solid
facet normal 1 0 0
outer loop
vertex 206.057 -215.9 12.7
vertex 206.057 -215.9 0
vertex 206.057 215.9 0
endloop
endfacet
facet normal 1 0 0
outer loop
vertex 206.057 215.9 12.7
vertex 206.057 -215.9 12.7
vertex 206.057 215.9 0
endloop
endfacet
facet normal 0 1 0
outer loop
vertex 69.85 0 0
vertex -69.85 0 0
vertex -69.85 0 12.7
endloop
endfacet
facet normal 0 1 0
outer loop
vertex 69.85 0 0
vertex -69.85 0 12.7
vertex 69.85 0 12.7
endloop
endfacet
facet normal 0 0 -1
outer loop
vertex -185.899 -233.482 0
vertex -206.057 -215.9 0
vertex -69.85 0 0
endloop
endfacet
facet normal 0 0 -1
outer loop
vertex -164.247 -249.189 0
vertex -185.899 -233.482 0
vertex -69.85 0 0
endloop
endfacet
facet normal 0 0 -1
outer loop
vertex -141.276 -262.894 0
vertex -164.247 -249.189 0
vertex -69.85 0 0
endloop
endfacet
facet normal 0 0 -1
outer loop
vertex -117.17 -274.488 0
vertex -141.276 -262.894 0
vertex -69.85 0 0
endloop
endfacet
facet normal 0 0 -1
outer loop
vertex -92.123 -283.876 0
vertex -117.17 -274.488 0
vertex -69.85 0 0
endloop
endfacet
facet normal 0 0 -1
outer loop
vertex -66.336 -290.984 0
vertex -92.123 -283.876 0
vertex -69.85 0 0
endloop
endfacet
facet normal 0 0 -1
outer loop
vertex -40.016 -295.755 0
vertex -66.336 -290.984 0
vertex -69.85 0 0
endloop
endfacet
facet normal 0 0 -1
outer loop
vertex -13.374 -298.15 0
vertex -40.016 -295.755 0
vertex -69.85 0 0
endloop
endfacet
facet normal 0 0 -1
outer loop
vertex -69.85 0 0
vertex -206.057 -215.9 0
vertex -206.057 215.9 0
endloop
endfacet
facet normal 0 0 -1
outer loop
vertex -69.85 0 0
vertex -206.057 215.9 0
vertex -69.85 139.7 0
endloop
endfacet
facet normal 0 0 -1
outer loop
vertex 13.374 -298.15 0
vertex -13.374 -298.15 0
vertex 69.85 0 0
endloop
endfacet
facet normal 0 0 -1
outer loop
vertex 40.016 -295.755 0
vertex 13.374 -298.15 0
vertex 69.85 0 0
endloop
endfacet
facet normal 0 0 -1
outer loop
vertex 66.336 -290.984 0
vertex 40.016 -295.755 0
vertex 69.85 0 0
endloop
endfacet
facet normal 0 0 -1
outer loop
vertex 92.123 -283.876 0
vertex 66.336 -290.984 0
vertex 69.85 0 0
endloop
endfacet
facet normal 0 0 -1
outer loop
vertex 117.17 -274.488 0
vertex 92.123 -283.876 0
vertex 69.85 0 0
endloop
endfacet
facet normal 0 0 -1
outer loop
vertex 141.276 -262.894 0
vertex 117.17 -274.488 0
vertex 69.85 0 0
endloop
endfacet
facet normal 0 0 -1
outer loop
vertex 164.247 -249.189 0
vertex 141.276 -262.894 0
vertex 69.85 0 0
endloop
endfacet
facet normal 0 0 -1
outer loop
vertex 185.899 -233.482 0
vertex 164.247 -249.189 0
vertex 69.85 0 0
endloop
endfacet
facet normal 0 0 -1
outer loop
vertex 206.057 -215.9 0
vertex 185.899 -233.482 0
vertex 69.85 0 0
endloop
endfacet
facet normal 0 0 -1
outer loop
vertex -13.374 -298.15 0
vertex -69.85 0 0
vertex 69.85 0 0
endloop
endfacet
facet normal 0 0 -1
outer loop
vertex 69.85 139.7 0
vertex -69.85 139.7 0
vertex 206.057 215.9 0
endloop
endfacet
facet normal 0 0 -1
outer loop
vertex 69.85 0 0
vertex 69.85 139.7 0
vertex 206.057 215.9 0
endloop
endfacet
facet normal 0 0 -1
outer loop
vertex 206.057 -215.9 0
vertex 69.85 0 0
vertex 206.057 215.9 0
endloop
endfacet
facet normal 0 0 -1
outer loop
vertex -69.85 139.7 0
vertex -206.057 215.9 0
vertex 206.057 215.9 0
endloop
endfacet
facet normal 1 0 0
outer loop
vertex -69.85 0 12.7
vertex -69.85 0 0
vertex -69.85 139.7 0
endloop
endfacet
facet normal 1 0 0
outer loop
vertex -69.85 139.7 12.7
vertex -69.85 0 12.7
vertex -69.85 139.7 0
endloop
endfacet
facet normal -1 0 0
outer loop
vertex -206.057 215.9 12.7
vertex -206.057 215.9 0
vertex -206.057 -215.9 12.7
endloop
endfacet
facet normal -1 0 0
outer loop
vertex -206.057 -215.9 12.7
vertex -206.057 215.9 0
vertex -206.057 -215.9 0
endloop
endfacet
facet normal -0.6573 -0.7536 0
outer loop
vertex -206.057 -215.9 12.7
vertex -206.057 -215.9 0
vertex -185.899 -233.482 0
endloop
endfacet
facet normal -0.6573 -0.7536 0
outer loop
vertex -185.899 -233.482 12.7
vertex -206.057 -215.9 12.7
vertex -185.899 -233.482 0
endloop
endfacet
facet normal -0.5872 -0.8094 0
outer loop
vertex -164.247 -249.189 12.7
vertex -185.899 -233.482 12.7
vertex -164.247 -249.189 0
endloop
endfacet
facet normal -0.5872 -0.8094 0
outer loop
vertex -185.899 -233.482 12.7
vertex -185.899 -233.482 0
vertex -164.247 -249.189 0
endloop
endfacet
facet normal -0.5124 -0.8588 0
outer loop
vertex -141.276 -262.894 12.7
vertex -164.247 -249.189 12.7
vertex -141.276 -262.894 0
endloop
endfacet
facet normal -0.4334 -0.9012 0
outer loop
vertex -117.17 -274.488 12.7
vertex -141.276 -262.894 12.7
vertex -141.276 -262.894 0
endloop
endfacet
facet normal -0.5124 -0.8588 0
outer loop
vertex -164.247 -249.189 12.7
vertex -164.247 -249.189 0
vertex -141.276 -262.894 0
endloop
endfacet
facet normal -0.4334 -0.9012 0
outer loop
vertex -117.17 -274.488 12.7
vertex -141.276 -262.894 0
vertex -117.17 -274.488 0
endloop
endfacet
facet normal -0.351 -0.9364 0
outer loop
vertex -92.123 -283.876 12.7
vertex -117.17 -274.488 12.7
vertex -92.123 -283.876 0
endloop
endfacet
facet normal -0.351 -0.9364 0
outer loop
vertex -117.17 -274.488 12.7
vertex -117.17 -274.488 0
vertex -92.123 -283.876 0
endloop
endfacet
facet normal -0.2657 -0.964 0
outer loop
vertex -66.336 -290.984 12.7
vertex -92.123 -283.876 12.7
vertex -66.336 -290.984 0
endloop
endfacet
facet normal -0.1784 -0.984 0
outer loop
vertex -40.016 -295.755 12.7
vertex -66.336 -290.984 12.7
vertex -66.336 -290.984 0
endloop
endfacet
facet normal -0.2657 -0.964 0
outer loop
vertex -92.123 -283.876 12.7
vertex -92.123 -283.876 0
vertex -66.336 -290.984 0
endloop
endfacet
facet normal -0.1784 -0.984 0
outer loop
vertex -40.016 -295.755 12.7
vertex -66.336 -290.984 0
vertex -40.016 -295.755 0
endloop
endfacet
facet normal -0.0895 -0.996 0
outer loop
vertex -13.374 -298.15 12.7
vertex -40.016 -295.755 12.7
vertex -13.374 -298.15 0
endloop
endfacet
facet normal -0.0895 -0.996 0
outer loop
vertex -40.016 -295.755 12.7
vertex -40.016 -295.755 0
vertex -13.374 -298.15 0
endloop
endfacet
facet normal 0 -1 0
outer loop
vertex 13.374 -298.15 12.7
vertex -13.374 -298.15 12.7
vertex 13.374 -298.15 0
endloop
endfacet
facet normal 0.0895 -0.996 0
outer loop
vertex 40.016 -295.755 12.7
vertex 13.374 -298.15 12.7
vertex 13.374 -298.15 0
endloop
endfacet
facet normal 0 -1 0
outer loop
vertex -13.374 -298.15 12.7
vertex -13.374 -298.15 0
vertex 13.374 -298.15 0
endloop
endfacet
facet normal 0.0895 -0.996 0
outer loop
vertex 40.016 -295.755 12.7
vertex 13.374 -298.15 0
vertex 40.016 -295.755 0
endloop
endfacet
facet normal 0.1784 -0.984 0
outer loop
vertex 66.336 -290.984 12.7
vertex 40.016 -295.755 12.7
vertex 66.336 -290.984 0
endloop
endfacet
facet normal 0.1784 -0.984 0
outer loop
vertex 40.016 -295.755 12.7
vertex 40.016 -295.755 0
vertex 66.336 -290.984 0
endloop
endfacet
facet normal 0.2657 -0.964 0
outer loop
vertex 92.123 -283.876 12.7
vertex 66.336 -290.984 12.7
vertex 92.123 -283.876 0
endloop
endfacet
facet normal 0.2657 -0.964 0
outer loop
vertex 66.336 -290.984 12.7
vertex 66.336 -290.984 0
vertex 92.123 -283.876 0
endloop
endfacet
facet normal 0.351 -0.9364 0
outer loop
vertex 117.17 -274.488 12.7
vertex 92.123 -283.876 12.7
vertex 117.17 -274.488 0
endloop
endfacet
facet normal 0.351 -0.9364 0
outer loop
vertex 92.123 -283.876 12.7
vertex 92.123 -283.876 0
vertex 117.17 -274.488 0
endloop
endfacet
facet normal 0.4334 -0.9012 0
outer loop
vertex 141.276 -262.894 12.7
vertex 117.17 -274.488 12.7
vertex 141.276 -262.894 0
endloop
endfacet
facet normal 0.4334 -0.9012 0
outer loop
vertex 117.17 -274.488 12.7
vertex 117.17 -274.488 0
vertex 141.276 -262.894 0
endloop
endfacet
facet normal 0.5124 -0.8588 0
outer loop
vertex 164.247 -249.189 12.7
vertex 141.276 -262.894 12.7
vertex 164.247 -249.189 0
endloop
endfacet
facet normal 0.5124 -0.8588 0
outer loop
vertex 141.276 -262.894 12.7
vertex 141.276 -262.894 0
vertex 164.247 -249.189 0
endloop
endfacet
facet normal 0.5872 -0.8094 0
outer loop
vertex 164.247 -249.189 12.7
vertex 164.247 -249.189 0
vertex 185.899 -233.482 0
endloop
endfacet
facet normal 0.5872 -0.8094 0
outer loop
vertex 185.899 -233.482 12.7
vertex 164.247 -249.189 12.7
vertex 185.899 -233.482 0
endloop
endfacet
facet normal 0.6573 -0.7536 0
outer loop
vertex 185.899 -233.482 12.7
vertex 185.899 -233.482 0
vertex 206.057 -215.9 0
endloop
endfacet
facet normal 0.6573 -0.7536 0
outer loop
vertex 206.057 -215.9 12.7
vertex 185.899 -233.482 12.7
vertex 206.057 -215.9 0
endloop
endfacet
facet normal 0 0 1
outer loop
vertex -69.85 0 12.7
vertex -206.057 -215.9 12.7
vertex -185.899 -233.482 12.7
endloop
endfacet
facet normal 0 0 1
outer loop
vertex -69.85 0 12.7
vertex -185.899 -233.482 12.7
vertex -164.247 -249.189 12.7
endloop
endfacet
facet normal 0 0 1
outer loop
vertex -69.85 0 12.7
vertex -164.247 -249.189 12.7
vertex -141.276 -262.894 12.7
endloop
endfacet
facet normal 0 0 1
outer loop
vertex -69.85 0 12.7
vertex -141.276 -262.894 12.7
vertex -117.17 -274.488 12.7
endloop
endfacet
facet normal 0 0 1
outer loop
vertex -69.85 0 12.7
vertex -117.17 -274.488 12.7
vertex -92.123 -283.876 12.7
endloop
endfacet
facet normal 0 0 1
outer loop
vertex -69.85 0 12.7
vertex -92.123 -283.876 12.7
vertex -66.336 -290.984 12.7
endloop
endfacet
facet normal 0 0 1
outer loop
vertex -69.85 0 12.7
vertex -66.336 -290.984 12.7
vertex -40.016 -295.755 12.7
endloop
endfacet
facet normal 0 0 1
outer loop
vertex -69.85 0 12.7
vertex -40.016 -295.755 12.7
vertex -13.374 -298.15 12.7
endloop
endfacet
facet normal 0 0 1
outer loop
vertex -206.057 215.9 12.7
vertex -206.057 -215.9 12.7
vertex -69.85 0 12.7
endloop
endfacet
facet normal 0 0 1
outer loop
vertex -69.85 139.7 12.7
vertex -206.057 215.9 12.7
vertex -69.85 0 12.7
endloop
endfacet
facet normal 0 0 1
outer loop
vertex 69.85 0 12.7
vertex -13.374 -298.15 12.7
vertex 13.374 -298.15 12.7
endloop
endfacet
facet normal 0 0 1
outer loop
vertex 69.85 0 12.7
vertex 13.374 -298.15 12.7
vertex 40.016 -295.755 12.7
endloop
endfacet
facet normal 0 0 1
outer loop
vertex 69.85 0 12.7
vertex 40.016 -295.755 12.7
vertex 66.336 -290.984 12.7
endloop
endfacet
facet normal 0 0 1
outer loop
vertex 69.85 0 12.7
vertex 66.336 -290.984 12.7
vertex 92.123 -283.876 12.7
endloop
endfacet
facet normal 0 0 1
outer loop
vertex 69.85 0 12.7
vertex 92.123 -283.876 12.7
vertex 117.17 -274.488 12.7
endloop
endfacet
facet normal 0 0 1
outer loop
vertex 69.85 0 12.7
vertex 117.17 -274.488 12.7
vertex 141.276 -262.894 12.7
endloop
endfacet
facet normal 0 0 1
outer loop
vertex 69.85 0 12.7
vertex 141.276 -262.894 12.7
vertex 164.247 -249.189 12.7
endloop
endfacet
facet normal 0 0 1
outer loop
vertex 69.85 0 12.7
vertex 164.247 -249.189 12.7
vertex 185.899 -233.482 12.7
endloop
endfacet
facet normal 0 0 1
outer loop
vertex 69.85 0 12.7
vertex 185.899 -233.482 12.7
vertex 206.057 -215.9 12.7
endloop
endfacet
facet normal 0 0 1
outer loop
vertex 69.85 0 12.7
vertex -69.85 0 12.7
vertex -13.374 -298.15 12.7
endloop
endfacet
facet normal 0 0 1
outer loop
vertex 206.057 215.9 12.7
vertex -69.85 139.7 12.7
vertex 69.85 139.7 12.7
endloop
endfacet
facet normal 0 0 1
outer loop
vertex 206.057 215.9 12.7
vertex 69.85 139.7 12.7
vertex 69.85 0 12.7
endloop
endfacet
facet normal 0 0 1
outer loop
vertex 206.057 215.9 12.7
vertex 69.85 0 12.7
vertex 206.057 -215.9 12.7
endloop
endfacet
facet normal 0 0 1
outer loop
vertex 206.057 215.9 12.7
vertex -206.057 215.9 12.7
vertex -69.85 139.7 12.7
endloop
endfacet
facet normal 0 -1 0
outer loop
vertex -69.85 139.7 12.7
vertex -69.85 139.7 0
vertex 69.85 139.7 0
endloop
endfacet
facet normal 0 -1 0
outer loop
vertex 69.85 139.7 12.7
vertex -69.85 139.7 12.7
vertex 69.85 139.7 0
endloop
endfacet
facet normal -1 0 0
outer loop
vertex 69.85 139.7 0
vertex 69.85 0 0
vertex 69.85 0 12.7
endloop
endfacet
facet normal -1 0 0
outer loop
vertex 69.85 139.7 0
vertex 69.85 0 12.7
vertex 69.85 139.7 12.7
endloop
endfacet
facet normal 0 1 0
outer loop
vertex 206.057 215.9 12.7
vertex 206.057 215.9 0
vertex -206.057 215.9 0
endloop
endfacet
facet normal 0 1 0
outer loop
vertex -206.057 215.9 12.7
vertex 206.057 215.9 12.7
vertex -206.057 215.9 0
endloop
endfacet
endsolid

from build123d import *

# Parameters (mm, degrees)
F0_W     = 139.7
F0_H     = 139.7
F1_DEPTH = 12.7
F2_DEPTH = 12.7


with BuildPart() as f1:
    # F0 (on Top) → F1 (new body)
    with BuildSketch(Plane.XY):
        with BuildLine():
            Line((-206.057255, 215.9), (-206.057255, -215.9))
            ThreePointArc((-206.057255, -215.9), (0, -298.45), (206.057255, -215.9))
            Line((206.057255, -215.9), (206.057255, 215.9))
            Line((206.057255, 215.9), (-206.057255, 215.9))
        make_face()
        with Locations((0, 69.85)):
            Rectangle(F0_W, F0_H, mode=Mode.SUBTRACT)
    extrude(amount=F1_DEPTH)

    # F0 (on Top) → F2 (join)
    with BuildSketch(Plane.XY):
        with BuildLine():
            Line((-206.057255, 215.9), (-206.057255, -215.9))
            ThreePointArc((-206.057255, -215.9), (0, -298.45), (206.057255, -215.9))
            Line((206.057255, -215.9), (206.057255, 215.9))
            Line((206.057255, 215.9), (-206.057255, 215.9))
        make_face()
        with Locations((0, 69.85)):
            Rectangle(F0_W, F0_H, mode=Mode.SUBTRACT)
    extrude(amount=F2_DEPTH)


solid = f1.part
